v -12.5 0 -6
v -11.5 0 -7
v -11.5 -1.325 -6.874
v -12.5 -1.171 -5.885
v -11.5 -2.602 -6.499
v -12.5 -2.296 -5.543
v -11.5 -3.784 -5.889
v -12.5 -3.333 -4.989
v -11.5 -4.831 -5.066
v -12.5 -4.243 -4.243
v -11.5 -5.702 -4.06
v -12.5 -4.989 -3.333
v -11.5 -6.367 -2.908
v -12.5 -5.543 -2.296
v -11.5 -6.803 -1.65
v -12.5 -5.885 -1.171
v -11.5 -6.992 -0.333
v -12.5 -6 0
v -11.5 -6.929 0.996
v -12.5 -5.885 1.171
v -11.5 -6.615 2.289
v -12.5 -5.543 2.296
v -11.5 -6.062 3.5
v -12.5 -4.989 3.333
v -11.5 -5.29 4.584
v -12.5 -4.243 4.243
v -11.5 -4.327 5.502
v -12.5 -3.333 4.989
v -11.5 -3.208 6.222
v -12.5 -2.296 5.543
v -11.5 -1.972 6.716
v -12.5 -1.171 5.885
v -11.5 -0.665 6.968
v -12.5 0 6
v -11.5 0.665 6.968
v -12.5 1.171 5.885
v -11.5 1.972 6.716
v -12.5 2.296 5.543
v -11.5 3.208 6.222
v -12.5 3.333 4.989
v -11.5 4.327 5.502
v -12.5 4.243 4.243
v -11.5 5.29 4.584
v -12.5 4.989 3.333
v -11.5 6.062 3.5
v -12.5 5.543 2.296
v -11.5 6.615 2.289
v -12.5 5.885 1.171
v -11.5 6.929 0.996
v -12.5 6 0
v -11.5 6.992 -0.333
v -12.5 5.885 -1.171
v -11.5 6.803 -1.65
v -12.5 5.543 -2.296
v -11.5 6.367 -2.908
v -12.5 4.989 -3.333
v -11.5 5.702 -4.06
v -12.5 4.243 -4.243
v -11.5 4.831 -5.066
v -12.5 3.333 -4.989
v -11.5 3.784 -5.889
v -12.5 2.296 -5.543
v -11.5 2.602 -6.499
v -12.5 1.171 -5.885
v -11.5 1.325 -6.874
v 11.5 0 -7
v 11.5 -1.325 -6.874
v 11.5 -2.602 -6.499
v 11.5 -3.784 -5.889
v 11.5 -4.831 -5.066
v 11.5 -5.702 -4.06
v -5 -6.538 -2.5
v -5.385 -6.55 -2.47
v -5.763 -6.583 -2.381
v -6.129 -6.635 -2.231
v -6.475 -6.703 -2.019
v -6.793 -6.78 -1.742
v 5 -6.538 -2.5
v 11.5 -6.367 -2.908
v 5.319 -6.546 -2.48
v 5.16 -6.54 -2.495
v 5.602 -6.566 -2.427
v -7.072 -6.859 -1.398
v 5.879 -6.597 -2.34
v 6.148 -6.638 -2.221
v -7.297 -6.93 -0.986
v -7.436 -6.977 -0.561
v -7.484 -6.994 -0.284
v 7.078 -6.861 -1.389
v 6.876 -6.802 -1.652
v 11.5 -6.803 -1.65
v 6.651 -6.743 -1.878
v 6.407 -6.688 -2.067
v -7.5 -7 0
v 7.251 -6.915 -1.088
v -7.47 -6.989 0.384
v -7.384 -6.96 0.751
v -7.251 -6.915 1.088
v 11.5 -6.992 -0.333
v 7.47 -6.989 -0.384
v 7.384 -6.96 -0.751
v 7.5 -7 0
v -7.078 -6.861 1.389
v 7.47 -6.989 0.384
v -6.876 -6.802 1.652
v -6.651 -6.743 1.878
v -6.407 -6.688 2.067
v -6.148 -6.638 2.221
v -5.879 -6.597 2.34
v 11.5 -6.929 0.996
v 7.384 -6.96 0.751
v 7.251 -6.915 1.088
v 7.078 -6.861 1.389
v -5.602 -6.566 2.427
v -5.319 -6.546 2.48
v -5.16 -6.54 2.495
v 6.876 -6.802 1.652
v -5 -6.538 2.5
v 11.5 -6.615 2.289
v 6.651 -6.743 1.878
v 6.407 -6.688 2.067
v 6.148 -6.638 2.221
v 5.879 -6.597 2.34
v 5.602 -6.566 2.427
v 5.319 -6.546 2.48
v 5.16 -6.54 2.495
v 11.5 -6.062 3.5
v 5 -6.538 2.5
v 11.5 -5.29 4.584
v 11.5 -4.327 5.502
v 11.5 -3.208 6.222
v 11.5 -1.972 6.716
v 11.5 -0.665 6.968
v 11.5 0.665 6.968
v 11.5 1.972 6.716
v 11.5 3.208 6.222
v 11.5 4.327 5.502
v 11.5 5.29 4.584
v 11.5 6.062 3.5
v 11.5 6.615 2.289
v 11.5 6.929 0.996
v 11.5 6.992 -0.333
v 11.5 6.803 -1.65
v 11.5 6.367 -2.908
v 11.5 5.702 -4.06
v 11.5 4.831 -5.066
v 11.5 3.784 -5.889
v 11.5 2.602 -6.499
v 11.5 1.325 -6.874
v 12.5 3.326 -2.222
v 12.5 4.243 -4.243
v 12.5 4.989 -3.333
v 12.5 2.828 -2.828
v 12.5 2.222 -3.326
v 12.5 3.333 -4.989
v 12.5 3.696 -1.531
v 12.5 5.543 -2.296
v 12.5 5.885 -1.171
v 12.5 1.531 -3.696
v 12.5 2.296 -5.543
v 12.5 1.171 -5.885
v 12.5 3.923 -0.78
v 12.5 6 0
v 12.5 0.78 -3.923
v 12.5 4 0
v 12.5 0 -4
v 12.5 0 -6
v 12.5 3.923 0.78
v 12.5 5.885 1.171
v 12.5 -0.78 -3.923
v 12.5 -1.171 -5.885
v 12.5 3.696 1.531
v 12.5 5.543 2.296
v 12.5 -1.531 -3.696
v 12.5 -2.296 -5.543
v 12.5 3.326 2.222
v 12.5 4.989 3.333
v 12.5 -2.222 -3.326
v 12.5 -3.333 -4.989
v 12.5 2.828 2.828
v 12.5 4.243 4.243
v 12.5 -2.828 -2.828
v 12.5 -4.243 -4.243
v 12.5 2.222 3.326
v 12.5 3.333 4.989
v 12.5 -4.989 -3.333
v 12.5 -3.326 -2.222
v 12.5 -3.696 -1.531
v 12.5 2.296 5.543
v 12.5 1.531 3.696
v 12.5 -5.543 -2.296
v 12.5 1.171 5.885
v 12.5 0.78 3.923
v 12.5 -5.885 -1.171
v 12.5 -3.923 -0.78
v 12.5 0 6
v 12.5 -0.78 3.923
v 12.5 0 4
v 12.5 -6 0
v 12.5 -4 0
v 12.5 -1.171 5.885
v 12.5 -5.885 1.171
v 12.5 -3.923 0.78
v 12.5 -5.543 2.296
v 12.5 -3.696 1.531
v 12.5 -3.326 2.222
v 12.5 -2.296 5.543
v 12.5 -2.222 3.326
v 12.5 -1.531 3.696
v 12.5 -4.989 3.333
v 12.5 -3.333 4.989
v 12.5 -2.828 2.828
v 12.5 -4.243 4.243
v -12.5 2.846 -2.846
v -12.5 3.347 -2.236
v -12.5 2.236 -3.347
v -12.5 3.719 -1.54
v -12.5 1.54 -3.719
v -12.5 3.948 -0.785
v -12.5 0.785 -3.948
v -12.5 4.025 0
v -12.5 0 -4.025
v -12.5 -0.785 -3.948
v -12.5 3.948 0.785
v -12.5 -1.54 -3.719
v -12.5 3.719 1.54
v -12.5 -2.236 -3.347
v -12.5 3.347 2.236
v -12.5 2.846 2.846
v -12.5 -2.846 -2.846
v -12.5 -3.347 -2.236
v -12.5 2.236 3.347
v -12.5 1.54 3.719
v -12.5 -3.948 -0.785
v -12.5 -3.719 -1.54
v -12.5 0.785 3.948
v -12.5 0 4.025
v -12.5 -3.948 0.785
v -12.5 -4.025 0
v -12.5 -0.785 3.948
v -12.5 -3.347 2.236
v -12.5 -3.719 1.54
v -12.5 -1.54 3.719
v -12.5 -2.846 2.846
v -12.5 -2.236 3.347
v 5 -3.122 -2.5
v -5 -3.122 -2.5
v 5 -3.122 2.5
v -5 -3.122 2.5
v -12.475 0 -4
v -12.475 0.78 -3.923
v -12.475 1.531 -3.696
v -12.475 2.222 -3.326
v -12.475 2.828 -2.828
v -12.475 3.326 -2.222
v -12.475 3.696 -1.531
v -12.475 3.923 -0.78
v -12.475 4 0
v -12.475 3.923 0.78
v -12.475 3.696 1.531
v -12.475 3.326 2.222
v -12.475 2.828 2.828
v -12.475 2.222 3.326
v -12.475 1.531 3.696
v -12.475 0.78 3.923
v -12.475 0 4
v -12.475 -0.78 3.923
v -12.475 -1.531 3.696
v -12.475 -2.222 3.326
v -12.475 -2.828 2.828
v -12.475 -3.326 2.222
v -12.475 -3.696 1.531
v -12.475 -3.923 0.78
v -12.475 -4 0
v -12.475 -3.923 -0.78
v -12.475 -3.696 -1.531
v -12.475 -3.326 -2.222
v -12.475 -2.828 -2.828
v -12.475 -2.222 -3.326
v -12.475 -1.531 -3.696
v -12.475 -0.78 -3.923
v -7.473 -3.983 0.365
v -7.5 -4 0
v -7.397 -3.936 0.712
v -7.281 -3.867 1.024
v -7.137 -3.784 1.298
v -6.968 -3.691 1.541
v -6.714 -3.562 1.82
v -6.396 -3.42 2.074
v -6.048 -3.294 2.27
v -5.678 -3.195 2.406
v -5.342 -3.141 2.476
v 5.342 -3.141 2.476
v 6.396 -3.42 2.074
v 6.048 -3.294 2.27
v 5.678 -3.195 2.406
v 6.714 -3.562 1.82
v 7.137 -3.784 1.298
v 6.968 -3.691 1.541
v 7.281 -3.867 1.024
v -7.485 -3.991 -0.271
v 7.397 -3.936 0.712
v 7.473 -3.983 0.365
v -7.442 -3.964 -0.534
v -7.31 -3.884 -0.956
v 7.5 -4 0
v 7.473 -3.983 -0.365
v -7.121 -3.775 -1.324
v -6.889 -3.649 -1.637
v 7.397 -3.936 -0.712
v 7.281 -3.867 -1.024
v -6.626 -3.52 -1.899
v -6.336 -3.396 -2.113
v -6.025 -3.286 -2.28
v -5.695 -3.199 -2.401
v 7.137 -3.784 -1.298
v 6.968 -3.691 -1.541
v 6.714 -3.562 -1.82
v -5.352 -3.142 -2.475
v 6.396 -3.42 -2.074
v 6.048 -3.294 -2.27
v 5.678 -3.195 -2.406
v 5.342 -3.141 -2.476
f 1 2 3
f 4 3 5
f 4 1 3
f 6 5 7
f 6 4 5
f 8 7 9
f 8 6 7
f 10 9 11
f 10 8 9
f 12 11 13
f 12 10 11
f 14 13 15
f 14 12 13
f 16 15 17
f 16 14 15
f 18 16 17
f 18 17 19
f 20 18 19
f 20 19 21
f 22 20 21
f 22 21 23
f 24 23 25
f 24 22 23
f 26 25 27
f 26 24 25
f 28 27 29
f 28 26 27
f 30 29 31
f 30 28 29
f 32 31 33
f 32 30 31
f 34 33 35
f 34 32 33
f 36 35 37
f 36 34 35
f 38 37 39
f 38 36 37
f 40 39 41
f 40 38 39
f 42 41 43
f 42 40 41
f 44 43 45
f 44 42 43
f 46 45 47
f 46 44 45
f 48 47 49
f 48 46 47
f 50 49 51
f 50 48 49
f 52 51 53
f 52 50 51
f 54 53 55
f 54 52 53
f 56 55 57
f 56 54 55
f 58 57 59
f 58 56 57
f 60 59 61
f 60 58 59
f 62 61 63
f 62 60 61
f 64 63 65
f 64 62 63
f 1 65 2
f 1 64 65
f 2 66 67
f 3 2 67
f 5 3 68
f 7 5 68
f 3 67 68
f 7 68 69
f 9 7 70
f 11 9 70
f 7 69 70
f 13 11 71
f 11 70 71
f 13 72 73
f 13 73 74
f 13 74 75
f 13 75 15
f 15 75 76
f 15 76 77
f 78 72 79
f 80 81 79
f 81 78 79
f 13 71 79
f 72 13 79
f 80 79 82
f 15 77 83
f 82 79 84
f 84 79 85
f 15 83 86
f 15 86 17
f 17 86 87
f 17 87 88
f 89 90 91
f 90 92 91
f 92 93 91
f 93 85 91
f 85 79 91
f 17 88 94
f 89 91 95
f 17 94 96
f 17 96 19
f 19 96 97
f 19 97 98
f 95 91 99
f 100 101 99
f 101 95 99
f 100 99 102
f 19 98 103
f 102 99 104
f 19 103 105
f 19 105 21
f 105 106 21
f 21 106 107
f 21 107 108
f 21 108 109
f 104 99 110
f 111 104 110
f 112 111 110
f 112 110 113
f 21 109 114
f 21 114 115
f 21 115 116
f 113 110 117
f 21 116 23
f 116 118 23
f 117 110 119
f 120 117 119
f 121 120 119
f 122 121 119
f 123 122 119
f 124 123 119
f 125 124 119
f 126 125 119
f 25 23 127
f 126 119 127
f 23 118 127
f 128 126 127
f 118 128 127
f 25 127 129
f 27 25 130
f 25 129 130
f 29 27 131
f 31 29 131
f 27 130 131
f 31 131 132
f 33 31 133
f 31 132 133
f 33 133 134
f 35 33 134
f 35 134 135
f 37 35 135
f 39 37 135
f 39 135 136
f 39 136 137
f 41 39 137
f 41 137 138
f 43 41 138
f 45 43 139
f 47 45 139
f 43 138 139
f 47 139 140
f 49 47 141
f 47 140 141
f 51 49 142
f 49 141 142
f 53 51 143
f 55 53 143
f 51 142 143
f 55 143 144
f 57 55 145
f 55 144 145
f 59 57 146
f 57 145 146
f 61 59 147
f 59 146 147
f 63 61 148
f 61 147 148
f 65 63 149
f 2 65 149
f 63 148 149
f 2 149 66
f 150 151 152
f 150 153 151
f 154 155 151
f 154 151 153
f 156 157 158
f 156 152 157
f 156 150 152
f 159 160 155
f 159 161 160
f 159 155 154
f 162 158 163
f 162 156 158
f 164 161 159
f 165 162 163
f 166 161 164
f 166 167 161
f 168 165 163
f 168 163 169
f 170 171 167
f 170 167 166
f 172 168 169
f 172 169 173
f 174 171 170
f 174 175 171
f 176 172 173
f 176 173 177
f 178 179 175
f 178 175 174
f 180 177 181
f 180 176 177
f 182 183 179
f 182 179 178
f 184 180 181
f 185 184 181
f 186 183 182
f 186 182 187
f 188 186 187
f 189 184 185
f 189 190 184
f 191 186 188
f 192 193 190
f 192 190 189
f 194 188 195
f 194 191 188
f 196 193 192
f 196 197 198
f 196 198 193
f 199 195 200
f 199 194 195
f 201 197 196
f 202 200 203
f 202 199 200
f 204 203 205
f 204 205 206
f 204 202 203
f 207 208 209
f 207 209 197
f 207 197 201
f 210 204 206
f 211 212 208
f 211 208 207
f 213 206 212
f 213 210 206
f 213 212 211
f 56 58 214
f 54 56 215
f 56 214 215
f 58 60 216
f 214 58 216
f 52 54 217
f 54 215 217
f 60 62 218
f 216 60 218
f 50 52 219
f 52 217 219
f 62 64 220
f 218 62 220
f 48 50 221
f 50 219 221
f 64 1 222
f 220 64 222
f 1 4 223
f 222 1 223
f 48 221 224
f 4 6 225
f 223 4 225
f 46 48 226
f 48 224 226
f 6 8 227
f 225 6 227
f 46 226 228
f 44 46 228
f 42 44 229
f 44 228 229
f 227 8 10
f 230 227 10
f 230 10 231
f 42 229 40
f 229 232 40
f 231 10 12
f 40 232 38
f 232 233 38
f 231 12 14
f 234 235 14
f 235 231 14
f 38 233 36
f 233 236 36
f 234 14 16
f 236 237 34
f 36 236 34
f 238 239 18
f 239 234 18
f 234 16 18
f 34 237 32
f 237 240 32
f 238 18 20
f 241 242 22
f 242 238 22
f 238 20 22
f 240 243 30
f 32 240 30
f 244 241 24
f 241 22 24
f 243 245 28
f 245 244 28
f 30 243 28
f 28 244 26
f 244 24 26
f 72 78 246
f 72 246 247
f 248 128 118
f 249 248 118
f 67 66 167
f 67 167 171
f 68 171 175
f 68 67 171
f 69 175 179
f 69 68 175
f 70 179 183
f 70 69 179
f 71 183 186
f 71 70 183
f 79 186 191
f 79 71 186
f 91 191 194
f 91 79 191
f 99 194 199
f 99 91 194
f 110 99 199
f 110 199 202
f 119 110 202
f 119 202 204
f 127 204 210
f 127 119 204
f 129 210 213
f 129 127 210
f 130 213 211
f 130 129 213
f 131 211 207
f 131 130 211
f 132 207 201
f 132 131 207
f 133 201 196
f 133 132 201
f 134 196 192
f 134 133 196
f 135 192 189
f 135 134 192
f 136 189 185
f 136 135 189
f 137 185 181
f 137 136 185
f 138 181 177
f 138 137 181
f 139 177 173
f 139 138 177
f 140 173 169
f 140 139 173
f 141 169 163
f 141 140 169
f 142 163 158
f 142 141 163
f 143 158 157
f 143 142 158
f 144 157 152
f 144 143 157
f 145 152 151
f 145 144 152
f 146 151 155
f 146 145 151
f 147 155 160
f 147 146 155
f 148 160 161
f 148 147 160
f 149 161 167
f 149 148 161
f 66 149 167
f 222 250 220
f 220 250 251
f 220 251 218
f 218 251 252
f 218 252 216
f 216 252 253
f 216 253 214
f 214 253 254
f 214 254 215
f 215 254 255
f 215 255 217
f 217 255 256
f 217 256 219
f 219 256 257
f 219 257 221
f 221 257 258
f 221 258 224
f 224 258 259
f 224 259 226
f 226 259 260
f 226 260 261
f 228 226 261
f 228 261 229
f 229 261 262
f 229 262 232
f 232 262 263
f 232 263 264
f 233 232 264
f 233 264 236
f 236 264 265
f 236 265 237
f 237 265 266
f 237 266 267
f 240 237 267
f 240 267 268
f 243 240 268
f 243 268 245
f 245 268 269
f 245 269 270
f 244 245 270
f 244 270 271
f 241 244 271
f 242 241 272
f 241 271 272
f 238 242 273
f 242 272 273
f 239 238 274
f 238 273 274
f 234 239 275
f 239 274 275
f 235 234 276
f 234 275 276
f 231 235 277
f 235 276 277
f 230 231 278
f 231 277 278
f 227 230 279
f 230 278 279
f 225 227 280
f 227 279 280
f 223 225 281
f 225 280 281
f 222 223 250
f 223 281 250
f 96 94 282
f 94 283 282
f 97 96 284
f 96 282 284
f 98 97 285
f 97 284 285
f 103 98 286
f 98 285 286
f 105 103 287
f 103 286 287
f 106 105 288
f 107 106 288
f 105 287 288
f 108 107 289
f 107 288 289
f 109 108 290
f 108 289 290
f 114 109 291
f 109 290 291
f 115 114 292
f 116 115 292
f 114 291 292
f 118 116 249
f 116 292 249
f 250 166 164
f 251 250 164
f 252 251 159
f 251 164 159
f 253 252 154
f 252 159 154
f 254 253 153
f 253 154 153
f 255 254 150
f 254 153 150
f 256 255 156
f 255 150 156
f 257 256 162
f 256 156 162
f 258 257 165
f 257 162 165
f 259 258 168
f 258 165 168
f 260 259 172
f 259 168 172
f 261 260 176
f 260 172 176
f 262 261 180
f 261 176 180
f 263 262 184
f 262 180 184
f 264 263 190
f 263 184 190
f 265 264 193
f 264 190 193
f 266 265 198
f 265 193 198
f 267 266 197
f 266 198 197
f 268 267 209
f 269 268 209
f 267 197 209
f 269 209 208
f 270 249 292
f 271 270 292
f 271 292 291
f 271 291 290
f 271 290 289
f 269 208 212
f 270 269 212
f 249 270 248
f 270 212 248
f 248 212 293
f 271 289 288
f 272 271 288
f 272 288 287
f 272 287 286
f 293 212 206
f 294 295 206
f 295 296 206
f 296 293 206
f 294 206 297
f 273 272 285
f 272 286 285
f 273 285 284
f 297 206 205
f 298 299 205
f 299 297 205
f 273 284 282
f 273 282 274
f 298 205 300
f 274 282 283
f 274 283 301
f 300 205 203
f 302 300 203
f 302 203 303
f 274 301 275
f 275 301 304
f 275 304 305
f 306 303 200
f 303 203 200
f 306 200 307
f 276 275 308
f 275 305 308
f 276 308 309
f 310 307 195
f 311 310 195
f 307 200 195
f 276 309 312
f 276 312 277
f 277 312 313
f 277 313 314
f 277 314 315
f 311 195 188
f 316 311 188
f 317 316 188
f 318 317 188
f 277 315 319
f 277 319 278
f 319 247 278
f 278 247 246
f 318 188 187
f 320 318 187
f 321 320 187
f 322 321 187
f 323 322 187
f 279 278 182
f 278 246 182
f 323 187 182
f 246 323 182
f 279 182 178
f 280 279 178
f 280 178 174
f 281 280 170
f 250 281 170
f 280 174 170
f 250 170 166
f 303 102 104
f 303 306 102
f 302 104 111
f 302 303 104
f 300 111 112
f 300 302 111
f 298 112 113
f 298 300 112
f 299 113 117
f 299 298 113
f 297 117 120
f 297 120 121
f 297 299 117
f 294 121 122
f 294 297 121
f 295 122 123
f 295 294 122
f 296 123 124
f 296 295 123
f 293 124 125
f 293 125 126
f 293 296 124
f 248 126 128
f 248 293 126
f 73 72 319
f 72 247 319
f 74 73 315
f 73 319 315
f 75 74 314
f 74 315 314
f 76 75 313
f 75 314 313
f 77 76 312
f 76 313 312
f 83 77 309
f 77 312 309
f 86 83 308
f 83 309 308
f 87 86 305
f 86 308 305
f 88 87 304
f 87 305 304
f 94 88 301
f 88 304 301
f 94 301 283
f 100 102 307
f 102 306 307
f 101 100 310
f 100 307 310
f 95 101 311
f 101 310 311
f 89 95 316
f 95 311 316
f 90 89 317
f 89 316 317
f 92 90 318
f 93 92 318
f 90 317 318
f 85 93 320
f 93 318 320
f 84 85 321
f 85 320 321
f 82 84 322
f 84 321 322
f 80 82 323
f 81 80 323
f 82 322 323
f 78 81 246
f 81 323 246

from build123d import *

# Parameters (mm, degrees)
SKETCH_1_W                      = 25
SKETCH_1_H                      = 3
HOLE_WIZARD_8_0_8_1_D           = 8
HOLE_WIZARD_8_0_8_1_DEPTH       = 5
HOLE_WIZARD_8_0_8_1_CSINK_D     = 8.05
HOLE_WIZARD_8_0_8_1_CSINK_ANGLE = 90
HOLE_WIZARD_8_0_8_1_TIP         = 2.403442476
SKETCH_3_W                      = 15
SKETCH_3_H                      = 5
CUT_EXTRUDE_1_DEPTH             = 4
FILLET_1_R                      = 2.5
CHAMFER_1_SIZE                  = 1


with BuildPart() as part:
    # Эскиз1 → Повернуть1 (revolve)
    with BuildSketch(Plane.XY, mode=Mode.PRIVATE) as revolve_1_sk:
        with Locations((0, 5.5)):
            Rectangle(SKETCH_1_W, SKETCH_1_H)
    revolve(revolve_1_sk.sketch.rotate(Axis((0, 0, 0), (-1, 0, 0)), 90), axis=Axis((0, 0, 0), (-1, 0, 0)))

    # Диаметр отверстия Ø8.0 (8)1
    with Locations(Plane.ZY.offset(12.5)):
        with Locations((0, 0)):
            CounterSinkHole(HOLE_WIZARD_8_0_8_1_D / 2, HOLE_WIZARD_8_0_8_1_CSINK_D / 2, depth=HOLE_WIZARD_8_0_8_1_DEPTH, counter_sink_angle=HOLE_WIZARD_8_0_8_1_CSINK_ANGLE)
            with Locations((0, 0, -(HOLE_WIZARD_8_0_8_1_DEPTH + HOLE_WIZARD_8_0_8_1_TIP / 2))):  # 118° drill point
                Cone(0, HOLE_WIZARD_8_0_8_1_D / 2, HOLE_WIZARD_8_0_8_1_TIP, mode=Mode.SUBTRACT)

    # Эскиз3 → Вырез-Вытянуть1 (cut)
    with BuildSketch(Plane(origin=(0, -7, 0), x_dir=(-1, 0, 0), z_dir=(0, -1, 0))):
        Rectangle(SKETCH_3_W, SKETCH_3_H)
    extrude(amount=-CUT_EXTRUDE_1_DEPTH, mode=Mode.SUBTRACT)

    # Скругление1
    fillet_1_edges = [part.edges().sort_by_distance(p)[0] for p in [
        (-7.5, -4.830423707, 2.5),
        (-7.5, -4.830423707, -2.5),
        (7.5, -4.830423707, 2.5),
        (7.5, -4.830423707, -2.5),
    ]]
    fillet(fillet_1_edges, radius=FILLET_1_R - 0.0001)  # a hair under: the kernel refuses the full size

    # Фаска1
    chamfer_1_edges = [part.edges().sort_by_distance(p)[0] for p in [
        (12.5, 0, 7),
        (-12.5, 0, 7),
    ]]
    chamfer(chamfer_1_edges, length=CHAMFER_1_SIZE)


solid = part.part
